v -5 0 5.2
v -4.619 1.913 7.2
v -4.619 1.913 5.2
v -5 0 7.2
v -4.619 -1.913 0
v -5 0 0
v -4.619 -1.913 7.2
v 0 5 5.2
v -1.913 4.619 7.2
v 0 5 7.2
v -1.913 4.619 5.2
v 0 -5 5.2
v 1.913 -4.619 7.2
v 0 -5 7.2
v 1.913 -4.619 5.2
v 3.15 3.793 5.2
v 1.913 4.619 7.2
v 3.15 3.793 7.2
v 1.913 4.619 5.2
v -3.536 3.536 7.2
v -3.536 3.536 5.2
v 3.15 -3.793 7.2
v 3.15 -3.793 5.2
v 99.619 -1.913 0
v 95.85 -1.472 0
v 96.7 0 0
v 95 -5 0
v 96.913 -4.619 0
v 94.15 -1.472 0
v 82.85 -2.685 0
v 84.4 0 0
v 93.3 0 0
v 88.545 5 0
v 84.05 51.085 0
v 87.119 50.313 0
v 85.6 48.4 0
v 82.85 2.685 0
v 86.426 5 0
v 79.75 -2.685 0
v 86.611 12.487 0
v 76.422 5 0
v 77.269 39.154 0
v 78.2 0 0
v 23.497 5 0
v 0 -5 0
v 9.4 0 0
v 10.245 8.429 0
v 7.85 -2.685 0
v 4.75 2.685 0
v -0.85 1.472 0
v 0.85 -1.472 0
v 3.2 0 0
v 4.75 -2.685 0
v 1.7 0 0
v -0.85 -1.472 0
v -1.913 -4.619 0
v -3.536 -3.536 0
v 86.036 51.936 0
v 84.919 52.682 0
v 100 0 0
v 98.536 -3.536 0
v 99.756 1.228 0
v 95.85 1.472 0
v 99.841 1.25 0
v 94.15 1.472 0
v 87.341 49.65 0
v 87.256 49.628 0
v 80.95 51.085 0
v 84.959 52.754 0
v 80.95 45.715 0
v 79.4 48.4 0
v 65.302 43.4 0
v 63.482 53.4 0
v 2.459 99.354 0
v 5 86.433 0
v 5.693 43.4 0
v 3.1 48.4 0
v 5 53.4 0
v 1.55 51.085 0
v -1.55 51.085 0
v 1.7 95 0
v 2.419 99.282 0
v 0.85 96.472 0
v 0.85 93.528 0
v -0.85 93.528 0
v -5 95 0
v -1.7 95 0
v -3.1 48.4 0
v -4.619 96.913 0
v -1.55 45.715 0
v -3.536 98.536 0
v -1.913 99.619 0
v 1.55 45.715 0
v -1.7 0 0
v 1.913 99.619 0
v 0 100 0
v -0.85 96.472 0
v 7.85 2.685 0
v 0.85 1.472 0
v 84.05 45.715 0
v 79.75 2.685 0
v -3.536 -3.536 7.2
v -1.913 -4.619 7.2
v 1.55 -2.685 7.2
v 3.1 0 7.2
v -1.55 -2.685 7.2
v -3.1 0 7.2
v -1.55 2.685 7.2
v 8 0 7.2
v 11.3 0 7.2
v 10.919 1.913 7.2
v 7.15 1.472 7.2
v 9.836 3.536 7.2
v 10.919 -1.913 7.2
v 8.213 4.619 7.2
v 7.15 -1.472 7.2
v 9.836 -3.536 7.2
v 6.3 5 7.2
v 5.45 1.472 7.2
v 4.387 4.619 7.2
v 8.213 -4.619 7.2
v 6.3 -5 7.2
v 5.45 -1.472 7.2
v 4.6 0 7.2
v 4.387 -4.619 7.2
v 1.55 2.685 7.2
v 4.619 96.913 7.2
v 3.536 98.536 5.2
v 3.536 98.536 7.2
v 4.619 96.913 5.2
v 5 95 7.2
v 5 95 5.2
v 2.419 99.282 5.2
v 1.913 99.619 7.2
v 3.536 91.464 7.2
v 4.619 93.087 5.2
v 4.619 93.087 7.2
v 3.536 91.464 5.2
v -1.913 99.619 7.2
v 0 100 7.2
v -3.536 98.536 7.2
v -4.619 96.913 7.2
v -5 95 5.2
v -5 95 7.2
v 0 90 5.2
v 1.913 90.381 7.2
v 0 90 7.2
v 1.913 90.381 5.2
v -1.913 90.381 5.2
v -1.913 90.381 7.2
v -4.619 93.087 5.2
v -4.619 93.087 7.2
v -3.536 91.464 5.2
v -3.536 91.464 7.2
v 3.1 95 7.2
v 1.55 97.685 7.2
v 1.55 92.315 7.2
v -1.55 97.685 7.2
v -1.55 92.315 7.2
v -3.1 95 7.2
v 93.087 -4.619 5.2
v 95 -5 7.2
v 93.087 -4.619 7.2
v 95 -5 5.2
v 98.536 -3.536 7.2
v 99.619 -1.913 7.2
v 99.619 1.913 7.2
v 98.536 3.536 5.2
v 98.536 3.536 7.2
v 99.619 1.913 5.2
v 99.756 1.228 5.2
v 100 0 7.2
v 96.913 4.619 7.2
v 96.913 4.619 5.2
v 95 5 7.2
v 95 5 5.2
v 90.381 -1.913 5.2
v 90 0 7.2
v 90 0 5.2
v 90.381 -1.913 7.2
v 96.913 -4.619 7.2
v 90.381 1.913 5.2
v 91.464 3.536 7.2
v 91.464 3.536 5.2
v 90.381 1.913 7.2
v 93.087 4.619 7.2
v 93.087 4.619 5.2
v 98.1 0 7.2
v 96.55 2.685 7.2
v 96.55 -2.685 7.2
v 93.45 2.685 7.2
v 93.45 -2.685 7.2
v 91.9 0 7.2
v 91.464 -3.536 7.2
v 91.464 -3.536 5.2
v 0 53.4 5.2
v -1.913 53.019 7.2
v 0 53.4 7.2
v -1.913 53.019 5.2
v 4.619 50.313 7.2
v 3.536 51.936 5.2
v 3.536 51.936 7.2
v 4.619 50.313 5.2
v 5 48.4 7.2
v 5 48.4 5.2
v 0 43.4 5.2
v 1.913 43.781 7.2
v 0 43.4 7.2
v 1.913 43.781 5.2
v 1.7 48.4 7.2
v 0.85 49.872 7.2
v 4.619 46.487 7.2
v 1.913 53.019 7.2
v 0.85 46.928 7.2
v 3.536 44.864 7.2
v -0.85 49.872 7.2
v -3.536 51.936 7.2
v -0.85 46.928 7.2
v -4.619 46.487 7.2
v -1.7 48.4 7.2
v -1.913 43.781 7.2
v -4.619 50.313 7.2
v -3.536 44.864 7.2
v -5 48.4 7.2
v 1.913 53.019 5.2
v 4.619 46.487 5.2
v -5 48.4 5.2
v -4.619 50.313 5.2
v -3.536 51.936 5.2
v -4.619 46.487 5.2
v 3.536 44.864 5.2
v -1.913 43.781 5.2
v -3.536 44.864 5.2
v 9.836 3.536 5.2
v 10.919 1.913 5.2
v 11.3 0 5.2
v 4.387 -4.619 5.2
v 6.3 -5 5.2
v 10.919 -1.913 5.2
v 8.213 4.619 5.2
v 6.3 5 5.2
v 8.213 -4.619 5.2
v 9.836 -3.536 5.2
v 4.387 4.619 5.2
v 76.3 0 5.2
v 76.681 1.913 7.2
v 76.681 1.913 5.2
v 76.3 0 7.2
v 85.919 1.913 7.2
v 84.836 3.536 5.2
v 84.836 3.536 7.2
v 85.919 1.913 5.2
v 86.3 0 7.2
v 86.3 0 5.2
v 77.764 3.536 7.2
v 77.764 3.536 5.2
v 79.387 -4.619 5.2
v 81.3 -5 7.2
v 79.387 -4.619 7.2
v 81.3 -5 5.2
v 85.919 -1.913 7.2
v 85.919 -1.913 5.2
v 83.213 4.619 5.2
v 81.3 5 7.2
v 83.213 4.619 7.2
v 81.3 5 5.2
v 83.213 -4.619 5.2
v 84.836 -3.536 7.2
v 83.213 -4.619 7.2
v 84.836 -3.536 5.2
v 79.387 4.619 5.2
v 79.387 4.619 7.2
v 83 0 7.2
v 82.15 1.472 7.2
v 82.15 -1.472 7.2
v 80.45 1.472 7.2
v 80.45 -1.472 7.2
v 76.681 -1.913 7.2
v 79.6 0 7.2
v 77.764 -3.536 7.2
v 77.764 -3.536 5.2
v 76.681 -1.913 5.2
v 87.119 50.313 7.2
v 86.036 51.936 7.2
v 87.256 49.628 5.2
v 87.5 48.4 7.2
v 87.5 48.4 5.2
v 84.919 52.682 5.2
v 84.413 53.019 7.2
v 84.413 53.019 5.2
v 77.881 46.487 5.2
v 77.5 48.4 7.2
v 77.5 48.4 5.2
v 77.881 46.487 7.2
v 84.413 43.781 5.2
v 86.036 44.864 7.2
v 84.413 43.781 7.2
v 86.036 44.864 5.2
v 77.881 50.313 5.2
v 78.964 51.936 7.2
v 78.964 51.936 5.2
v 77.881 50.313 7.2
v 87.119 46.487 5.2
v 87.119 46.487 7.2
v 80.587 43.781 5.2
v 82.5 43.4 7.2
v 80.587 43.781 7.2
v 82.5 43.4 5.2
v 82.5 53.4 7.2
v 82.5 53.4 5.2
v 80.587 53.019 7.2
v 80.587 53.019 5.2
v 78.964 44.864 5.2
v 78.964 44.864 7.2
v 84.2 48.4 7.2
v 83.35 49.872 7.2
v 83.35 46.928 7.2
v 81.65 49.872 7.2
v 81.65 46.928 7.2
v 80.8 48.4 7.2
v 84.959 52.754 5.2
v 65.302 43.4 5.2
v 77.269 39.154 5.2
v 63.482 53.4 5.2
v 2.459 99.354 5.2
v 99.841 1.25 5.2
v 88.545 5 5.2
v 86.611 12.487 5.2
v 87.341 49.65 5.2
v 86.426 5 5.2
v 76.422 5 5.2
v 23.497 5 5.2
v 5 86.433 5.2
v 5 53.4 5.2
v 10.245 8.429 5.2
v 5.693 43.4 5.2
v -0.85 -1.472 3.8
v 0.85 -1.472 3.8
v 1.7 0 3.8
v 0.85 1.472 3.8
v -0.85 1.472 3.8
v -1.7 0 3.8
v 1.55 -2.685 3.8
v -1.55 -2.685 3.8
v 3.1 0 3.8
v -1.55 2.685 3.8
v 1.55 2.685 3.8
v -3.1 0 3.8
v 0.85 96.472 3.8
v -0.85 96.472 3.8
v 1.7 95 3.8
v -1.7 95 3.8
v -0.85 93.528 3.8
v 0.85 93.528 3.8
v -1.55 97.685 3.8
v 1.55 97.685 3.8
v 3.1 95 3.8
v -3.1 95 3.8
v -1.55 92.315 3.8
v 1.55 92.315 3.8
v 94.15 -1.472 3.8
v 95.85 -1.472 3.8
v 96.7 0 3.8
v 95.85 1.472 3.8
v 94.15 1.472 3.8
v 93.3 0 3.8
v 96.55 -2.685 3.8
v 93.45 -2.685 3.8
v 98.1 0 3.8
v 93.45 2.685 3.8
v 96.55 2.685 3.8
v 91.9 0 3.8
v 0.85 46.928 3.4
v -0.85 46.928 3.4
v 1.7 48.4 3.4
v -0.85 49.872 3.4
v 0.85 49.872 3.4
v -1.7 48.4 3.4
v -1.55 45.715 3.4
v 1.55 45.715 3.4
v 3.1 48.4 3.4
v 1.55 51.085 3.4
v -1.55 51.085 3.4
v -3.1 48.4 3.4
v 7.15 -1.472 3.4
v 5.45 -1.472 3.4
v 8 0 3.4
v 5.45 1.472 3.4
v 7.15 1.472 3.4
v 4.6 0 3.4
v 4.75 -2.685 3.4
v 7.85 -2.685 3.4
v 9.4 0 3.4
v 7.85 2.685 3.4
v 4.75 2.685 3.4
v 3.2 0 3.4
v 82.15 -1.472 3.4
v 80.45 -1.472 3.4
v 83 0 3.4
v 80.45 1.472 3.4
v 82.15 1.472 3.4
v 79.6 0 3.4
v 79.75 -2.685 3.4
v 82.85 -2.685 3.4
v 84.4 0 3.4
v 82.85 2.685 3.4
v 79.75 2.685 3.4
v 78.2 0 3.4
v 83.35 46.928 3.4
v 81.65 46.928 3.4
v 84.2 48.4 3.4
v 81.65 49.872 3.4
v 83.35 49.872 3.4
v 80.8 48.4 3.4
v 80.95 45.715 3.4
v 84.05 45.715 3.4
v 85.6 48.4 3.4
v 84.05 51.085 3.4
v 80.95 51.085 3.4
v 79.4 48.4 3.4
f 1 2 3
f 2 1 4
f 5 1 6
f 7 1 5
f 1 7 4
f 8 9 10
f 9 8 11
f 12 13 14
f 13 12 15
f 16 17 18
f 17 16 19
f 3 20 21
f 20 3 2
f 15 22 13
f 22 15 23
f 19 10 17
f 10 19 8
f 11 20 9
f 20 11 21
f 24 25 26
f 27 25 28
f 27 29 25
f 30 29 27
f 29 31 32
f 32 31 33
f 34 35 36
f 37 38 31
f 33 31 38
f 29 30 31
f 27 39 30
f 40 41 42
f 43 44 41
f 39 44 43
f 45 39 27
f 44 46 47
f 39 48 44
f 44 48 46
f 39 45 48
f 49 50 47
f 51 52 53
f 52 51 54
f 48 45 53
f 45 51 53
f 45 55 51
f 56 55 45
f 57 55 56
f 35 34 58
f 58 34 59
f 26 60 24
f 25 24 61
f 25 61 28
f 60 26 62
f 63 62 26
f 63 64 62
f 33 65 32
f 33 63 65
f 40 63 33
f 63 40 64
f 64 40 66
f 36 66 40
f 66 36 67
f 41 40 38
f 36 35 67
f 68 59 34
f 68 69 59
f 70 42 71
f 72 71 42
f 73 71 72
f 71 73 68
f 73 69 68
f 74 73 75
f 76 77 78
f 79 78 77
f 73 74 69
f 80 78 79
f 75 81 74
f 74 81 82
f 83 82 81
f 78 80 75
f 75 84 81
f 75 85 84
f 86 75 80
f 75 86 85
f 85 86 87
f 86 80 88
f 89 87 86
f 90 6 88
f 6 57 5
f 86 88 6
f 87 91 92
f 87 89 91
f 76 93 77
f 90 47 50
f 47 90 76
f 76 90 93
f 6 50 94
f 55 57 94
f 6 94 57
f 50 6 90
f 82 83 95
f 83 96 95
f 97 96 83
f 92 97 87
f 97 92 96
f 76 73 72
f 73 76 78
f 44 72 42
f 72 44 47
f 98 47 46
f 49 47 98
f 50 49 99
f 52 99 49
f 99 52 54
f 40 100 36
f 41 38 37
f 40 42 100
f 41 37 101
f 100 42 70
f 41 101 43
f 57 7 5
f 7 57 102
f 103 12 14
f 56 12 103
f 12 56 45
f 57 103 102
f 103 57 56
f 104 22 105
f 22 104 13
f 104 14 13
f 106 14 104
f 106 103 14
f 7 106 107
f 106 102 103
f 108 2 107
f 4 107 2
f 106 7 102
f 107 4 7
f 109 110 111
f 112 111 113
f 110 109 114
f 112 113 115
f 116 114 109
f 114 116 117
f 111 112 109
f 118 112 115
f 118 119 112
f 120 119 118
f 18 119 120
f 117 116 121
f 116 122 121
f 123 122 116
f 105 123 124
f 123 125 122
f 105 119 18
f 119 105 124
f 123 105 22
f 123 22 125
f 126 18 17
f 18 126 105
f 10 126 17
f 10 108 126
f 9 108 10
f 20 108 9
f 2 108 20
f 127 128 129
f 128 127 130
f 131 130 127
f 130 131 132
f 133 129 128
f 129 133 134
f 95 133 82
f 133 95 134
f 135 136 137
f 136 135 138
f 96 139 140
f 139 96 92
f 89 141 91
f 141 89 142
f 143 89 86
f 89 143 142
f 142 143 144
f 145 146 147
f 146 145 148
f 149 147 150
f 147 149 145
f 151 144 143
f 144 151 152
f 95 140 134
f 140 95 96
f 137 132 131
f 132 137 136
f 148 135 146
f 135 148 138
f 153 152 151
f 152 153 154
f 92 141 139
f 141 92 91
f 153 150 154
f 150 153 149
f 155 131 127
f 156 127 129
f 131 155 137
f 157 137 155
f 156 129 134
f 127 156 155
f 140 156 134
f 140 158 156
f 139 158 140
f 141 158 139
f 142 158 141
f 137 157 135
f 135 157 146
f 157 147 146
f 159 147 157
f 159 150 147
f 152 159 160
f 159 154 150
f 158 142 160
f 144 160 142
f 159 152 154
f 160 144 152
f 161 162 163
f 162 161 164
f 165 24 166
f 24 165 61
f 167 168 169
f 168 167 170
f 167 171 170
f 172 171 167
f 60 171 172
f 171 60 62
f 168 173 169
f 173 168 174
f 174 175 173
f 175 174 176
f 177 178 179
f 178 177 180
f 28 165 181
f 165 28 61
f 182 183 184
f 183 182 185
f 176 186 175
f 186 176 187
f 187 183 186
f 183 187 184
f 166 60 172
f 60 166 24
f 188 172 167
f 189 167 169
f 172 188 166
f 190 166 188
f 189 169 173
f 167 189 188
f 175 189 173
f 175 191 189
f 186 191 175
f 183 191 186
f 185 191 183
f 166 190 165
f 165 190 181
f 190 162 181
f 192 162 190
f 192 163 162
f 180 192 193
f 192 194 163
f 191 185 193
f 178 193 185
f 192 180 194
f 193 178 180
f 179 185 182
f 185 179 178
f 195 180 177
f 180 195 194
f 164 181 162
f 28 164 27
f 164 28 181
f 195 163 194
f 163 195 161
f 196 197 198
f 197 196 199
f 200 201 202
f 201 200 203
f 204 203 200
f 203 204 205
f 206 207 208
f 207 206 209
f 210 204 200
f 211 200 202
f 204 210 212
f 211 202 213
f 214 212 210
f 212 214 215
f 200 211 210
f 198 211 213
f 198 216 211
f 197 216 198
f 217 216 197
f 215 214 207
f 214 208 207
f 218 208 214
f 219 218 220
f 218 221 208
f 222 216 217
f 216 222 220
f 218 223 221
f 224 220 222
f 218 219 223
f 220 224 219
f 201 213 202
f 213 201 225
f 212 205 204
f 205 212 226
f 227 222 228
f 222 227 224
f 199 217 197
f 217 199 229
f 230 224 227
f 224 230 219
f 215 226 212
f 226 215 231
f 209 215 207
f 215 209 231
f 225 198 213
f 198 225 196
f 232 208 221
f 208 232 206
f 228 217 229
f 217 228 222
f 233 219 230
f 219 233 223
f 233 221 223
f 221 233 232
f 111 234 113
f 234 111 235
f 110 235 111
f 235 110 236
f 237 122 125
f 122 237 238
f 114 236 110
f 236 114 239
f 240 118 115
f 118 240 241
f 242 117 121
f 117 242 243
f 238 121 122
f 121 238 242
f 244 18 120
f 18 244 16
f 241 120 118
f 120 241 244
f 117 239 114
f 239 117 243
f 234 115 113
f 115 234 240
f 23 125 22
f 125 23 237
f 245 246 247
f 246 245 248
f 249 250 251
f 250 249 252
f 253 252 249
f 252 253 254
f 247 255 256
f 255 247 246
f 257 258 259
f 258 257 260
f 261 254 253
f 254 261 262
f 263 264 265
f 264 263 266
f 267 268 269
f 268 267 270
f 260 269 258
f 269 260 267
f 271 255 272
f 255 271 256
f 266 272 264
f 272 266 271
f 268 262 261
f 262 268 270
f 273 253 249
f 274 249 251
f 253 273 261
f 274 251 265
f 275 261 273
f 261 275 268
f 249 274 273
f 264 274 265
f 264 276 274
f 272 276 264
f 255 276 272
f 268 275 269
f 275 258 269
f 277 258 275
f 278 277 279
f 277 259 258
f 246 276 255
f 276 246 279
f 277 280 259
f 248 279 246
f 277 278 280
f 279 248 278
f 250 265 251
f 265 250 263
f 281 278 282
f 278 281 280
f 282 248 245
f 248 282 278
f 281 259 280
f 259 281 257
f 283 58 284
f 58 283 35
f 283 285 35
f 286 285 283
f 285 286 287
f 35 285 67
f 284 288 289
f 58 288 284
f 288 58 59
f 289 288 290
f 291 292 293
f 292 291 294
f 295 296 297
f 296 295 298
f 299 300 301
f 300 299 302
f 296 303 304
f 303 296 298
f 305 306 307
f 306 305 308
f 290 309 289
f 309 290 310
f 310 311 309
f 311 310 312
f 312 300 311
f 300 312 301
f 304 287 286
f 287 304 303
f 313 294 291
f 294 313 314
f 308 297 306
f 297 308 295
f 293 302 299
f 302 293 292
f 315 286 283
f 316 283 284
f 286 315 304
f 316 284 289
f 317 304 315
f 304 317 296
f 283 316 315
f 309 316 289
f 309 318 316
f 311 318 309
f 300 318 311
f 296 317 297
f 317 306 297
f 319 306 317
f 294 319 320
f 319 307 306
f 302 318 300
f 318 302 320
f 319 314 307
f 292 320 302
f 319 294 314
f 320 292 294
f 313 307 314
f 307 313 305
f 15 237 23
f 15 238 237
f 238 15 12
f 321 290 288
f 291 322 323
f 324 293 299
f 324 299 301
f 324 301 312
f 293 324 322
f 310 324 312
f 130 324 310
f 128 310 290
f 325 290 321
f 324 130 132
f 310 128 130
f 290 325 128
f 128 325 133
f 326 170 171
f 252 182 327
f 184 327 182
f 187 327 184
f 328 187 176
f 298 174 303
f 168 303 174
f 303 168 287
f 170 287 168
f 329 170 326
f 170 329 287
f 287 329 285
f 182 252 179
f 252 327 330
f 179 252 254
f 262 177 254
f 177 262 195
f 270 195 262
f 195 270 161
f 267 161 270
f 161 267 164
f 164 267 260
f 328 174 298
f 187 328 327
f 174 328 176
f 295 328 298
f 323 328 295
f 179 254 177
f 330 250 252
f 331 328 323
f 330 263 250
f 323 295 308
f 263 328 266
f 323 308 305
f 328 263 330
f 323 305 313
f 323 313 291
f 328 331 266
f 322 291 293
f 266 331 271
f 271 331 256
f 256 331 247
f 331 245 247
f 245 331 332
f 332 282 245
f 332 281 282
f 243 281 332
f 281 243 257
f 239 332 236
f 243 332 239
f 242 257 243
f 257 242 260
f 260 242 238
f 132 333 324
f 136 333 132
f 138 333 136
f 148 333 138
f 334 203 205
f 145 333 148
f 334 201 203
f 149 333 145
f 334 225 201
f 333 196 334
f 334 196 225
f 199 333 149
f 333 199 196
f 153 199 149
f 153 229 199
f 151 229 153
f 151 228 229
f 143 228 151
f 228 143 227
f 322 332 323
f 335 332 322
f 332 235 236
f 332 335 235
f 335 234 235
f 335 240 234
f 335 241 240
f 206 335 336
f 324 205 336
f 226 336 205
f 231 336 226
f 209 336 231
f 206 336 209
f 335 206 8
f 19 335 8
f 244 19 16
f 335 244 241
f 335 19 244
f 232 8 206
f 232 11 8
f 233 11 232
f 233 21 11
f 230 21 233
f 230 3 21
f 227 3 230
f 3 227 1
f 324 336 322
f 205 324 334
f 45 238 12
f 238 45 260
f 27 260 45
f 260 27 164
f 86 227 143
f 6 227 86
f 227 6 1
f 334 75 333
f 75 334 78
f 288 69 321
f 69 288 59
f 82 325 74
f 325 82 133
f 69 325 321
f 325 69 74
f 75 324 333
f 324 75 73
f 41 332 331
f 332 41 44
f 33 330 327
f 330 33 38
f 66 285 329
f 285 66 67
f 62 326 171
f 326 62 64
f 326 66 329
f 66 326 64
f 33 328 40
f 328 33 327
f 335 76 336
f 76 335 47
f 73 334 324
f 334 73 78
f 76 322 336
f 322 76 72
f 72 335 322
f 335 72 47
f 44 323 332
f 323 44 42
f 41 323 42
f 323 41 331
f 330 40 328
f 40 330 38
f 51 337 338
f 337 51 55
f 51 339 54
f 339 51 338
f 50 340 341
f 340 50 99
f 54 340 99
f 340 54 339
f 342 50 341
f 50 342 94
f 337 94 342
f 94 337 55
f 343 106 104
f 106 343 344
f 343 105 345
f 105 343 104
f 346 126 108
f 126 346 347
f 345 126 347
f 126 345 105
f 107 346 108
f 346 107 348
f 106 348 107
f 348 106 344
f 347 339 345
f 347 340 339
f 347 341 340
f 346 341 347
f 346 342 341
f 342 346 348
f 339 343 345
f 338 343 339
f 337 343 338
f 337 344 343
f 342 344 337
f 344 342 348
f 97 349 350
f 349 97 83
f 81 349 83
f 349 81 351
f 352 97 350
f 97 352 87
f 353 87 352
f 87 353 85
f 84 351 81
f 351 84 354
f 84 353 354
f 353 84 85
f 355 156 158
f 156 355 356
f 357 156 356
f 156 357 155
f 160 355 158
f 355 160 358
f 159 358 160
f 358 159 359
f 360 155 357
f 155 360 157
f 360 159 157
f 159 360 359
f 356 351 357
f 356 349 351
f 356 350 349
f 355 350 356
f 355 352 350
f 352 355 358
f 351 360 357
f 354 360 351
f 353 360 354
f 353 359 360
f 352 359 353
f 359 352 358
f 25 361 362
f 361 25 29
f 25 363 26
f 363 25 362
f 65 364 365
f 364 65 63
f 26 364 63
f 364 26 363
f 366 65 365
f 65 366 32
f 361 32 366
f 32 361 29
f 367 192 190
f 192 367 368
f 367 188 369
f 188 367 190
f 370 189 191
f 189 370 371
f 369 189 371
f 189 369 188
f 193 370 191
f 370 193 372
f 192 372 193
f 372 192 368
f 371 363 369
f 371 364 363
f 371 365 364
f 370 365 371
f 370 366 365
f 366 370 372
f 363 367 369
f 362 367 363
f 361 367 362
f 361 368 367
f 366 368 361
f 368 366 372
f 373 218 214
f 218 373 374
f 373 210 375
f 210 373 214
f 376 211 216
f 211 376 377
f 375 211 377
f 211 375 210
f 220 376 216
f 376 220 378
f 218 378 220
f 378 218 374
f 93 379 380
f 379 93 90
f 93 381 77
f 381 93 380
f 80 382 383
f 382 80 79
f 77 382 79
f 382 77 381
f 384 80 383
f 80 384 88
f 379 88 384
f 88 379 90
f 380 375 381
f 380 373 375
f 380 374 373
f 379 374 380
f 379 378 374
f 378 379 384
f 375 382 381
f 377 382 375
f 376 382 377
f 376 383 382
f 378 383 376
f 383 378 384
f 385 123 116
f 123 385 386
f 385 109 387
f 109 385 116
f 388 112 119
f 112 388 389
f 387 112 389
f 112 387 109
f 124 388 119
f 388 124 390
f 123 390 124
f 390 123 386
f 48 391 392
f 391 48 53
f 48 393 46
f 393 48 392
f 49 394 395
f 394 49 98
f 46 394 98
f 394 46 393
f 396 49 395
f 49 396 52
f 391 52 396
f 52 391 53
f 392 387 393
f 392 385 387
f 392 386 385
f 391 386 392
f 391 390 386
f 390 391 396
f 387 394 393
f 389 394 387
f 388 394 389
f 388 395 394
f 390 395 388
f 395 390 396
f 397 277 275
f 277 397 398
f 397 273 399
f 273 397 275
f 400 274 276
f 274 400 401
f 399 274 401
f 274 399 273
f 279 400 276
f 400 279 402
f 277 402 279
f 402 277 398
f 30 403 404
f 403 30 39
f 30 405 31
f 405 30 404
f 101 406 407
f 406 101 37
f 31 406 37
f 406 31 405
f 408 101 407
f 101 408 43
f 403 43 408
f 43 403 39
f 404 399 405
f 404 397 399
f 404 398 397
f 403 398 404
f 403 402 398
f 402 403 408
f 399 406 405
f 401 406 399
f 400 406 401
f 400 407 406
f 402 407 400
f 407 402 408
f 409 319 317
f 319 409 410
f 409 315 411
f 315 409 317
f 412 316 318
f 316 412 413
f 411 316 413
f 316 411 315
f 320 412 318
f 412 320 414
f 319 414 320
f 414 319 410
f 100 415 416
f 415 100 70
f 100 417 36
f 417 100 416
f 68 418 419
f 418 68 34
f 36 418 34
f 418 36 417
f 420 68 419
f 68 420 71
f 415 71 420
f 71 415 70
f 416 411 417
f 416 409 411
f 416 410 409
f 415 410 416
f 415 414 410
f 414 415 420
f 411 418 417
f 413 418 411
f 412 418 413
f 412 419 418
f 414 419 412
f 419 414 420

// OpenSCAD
// 2018/05/06 v1.0 Laurie Gellatly 
// 2018/06/09 v1.1 Only draw the closest 'bars'bolt_hole_diameter
// 2018/06/10 v1.2 Add stand_offs and recess nuts
// Customiseable mount plate
// 

// (3.4 for M3 bolts) slightly larger than bolt diameter?
bolt_hole_diameter  = 3.4; // [1.1:0.1:5]
// for chosen bolt (use 6.2 for M3)?
hex_nut_hole_diameter   = 6.2; // [3:0.1:10]
// above plate?
stand_off = 2;       // [0:0.1:10]
stand_off_diameter = 10;         // [5:0.1:12]
// by bars?
nearest_holes_connected = 1;           // [1:5]
// of all the holes (',' between and no spaces)?
x_values="0,0,95,0,6.3,81.3,82.5";
// of all the holes (in the same order as X)?
y_values="0,95,0,48.4,0,0,48.4";
// is 0 for underneath, 1 for on top, 2 for none (in same order as X) ?
nut_side="1,1,1,0,0,0,0";

/* [Hidden] */
nut_thickness = 2.4;
hole_depth = 1 + nut_thickness; // The extra 1 makes the nut recessed
plate_thickness = hole_depth + 1.8;
abit=0.01;

function substr(s, st, en, p="") =
    (st >= en || st >= len(s)) ? p : substr(s, st+1, en, str(p, s[st]));

// Thanks to Jesse for atof and atoi
// Jesse Campbell
// www.jbcse.com
// OpenSCAD ascii string to number conversion function atof
// scientific notation support added by Alexander Pruss (thingiverse user arpruss)
// atoi are from http://www.thingiverse.com/roipoussiere

function atoi(str, base=10, i=0, nb=0) =
	i == len(str) ? (str[0] == "-" ? -nb : nb) :
	i == 0 && str[0] == "-" ? atoi(str, base, 1) :
	atoi(str, base, i + 1,
		nb + search(str[i], "0123456789ABCDEF")[0] * pow(base, len(str) - i - 1));
    
function atof(str) = len(str) == 0 ? 0 : let( expon1 = search("e", str), expon = len(expon1) ? expon1 : search("E", str)) len(expon) ? atof(substr(str,pos=0,len=expon[0])) * pow(10, atoi(substr(str,pos=expon[0]+1))) : let( multiplyBy = (str[0] == "-") ? -1 : 1, str = (str[0] == "-" || str[0] == "+") ? substr(str, 1, len(str)-1) : str, decimal = search(".", str), beforeDecimal = decimal == [] ? str : substr(str, 0, decimal[0]), afterDecimal = decimal == [] ? "0" : substr(str, decimal[0]+1) ) (multiplyBy * (atoi(beforeDecimal) + atoi(afterDecimal)/pow(10,len(afterDecimal)))); 
// End Jesse Campbell

function split(h, s, p=[]) =
    let(x = search(h, s)) 
    x == []
        ? concat(p, s)
        : let(i=x[0], l=substr(s, 0, i), r=substr(s, i+1, len(s)))
                split(h, r, concat(p, l));

// input : list of pairs of numbers
// output : sorted list (by second number) of paired number 
function quicksort(arr) = !(len(arr)>0) ? [] : let(
    pivot   = arr[floor(len(arr)/2)],
    lesser  = [ for (y = arr) if (y[1]  < pivot[1]) y ],
    equal   = [ for (y = arr) if (y[1] == pivot[1]) y ],
    greater = [ for (y = arr) if (y[1]  > pivot[1]) y ]
) concat(
    quicksort(lesser), equal, quicksort(greater)
);

function distarray(p, holes) = [for (c=[p+1:1:len(holes)-1]) [c,distance(holes[p],holes[c])]];
    
function distance(pos1,pos2)= // Find the distance between pos1 and pos2
    pow(pow(pos1[0] - pos2[0], 2) + pow(pos1[1] - pos2[1], 2), 0.5); // ((x1-x2)^2 + (y1-y2)^2)^.5)


function angle(pos1,pos2) = // Find the angle from pos1 to pos2
    atan((pos2[1] - pos1[1]) / (pos2[0] - pos1[0])) + ((pos2[0] < pos1[0]) ? 180 : 0); // atan((y2-y1)/ (x2-x1))
//    atan((pos2[1] - pos1[1]) / pow(pos2[0] - pos1[0])); // atan((y2-y1)/ (x2-x1))

module pad(pos){    // draw a pad at pos
    translate([pos[0],pos[1],0]) cylinder(d=stand_off_diameter, h=stand_off+plate_thickness);
}

module bar(pos1,pos2){  // Draw a bar between pos1 and pos2
    translate([pos1[0],pos1[1],0])rotate([0,0,angle(pos1,pos2)]) translate([0,-stand_off_diameter*0.5,0]) cube([distance(pos1,pos2), stand_off_diameter, plate_thickness]);
}
xv=split(",",x_values);
yv=split(",",y_values);
nv=split(",",nut_side);
if((len(xv) == len(yv)) && (len(xv) == len(nv))){
holes=[for (ind=[0:len(xv)-1]) [atof(xv[ind]),atof(yv[ind]),atoi(nv[ind])]];
   echo(holes);
difference(){
    union(){
        for(p=[0:1:len(holes)-1])
            pad(holes[p]);      // Draw a pad around each hole
        for(p=[0:1:len(holes)-1]){ // From a hole to every remaining hole
            dist = distarray(p,holes);   // Fnd the distances to them
            //echo(dist);
            mindist = quicksort(dist); // sort them by distance
            //echo(mindist);
            for(b=[0:1:nearest_holes_connected])   // Draw bars to the closest 'holes'
                bar(holes[p],holes[mindist[b][0]]);
        }
    }    
    for(p=[0:1:len(holes)-1]){
        translate([holes[p][0],holes[p][1],-abit]) cylinder(d=bolt_hole_diameter,h=stand_off+plate_thickness+2*abit);    // Bolt hole
        if(holes[p][2] != 2) translate([holes[p][0],holes[p][1],(holes[p][2] == 1)? stand_off+plate_thickness - hole_depth: -abit]) cylinder(d=hex_nut_hole_diameter,h=hole_depth+abit,$fn=6);    // Nut hole
    }
}
}else echo("Error:Input X, Y and nut_side values are not the same length!");
